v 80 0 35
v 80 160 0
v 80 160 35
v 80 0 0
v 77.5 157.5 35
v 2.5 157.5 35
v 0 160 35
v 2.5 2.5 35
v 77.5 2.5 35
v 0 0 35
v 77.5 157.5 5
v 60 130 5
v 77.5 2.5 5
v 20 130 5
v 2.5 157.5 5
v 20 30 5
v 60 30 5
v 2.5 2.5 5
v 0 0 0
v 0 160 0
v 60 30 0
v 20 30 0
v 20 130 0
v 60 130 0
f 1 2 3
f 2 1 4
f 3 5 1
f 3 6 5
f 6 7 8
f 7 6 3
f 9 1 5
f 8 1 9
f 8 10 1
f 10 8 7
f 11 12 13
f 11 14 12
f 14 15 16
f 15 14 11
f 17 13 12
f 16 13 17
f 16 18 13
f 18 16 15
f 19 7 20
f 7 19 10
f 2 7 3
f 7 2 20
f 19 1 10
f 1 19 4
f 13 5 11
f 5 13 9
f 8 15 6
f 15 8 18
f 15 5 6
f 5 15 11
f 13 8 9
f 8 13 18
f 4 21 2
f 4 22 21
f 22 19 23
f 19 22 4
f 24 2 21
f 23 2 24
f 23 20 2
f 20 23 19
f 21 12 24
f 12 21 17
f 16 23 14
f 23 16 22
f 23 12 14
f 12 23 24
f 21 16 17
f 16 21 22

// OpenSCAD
// Customizable LCD Holder Box
// 2013 Frank Avery
// dieselpoweredrobotics.com

//Settable Variables

// Defines the length of the box
box_length = 160; // Numeric vaue highter than Screen Length

// Defines the width of the box
box_width = 80; // Numeric value higher than Screen Width

// Defines the LCD screen length
screen_length = 100; // Numeric value smaller than Box Length

// Defines the LCD screen height
screen_width = 40; // Numeric value smaller than Box Width

// Determines the thickness of the box walls
wall_thickness = 5; // Top may not fix if thickness is reduced below 2.

// Determines how tall the box is (height of the sidewalls)
wall_height = 30; // Any numeric value

// Generate a cover for the other side of the box
generate_top = "yes"; // [Yes,No]


//Calculated Variables
wall_offset = wall_thickness / 2;
screen_offset_y = (box_length - screen_length) / 2;
screen_offset_x = (box_width - screen_width) / 2;

module lcdbox()
{
	//lcd screen box
	module screen()
	{
		translate([screen_offset_x,screen_offset_y,-5]) 
		cube([screen_width,screen_length,30]);
	}

	//front faceplate
	module holder()
	{
		cube([box_width,box_length,wall_thickness]);
	}

	//sidewalls of the box
	module sidewalls()
	{
		difference()
		{
			translate([0,0,wall_thickness]) cube([box_width,box_length,wall_height]);
			translate([wall_offset,wall_offset,-5]) cube([box_width-wall_thickness,box_length-wall_thickness,wall_height+20]);
		}
		
	}

	//join sidewalls to difference between holder and screen
	union()
	{
		sidewalls();
		difference()
		{
			holder();
			screen();
		}
	}
}

//top to be printed
module lcdbottom()
{
	translate([-100,0,0])
	cube([box_width, box_length,wall_thickness]);

	translate([-100+wall_offset,wall_offset,wall_thickness])
	cube([box_width-wall_thickness,box_length-wall_thickness,wall_thickness]);
}

lcdbox();

if (generate_top == "Yes")
{
	lcdbottom();
}
